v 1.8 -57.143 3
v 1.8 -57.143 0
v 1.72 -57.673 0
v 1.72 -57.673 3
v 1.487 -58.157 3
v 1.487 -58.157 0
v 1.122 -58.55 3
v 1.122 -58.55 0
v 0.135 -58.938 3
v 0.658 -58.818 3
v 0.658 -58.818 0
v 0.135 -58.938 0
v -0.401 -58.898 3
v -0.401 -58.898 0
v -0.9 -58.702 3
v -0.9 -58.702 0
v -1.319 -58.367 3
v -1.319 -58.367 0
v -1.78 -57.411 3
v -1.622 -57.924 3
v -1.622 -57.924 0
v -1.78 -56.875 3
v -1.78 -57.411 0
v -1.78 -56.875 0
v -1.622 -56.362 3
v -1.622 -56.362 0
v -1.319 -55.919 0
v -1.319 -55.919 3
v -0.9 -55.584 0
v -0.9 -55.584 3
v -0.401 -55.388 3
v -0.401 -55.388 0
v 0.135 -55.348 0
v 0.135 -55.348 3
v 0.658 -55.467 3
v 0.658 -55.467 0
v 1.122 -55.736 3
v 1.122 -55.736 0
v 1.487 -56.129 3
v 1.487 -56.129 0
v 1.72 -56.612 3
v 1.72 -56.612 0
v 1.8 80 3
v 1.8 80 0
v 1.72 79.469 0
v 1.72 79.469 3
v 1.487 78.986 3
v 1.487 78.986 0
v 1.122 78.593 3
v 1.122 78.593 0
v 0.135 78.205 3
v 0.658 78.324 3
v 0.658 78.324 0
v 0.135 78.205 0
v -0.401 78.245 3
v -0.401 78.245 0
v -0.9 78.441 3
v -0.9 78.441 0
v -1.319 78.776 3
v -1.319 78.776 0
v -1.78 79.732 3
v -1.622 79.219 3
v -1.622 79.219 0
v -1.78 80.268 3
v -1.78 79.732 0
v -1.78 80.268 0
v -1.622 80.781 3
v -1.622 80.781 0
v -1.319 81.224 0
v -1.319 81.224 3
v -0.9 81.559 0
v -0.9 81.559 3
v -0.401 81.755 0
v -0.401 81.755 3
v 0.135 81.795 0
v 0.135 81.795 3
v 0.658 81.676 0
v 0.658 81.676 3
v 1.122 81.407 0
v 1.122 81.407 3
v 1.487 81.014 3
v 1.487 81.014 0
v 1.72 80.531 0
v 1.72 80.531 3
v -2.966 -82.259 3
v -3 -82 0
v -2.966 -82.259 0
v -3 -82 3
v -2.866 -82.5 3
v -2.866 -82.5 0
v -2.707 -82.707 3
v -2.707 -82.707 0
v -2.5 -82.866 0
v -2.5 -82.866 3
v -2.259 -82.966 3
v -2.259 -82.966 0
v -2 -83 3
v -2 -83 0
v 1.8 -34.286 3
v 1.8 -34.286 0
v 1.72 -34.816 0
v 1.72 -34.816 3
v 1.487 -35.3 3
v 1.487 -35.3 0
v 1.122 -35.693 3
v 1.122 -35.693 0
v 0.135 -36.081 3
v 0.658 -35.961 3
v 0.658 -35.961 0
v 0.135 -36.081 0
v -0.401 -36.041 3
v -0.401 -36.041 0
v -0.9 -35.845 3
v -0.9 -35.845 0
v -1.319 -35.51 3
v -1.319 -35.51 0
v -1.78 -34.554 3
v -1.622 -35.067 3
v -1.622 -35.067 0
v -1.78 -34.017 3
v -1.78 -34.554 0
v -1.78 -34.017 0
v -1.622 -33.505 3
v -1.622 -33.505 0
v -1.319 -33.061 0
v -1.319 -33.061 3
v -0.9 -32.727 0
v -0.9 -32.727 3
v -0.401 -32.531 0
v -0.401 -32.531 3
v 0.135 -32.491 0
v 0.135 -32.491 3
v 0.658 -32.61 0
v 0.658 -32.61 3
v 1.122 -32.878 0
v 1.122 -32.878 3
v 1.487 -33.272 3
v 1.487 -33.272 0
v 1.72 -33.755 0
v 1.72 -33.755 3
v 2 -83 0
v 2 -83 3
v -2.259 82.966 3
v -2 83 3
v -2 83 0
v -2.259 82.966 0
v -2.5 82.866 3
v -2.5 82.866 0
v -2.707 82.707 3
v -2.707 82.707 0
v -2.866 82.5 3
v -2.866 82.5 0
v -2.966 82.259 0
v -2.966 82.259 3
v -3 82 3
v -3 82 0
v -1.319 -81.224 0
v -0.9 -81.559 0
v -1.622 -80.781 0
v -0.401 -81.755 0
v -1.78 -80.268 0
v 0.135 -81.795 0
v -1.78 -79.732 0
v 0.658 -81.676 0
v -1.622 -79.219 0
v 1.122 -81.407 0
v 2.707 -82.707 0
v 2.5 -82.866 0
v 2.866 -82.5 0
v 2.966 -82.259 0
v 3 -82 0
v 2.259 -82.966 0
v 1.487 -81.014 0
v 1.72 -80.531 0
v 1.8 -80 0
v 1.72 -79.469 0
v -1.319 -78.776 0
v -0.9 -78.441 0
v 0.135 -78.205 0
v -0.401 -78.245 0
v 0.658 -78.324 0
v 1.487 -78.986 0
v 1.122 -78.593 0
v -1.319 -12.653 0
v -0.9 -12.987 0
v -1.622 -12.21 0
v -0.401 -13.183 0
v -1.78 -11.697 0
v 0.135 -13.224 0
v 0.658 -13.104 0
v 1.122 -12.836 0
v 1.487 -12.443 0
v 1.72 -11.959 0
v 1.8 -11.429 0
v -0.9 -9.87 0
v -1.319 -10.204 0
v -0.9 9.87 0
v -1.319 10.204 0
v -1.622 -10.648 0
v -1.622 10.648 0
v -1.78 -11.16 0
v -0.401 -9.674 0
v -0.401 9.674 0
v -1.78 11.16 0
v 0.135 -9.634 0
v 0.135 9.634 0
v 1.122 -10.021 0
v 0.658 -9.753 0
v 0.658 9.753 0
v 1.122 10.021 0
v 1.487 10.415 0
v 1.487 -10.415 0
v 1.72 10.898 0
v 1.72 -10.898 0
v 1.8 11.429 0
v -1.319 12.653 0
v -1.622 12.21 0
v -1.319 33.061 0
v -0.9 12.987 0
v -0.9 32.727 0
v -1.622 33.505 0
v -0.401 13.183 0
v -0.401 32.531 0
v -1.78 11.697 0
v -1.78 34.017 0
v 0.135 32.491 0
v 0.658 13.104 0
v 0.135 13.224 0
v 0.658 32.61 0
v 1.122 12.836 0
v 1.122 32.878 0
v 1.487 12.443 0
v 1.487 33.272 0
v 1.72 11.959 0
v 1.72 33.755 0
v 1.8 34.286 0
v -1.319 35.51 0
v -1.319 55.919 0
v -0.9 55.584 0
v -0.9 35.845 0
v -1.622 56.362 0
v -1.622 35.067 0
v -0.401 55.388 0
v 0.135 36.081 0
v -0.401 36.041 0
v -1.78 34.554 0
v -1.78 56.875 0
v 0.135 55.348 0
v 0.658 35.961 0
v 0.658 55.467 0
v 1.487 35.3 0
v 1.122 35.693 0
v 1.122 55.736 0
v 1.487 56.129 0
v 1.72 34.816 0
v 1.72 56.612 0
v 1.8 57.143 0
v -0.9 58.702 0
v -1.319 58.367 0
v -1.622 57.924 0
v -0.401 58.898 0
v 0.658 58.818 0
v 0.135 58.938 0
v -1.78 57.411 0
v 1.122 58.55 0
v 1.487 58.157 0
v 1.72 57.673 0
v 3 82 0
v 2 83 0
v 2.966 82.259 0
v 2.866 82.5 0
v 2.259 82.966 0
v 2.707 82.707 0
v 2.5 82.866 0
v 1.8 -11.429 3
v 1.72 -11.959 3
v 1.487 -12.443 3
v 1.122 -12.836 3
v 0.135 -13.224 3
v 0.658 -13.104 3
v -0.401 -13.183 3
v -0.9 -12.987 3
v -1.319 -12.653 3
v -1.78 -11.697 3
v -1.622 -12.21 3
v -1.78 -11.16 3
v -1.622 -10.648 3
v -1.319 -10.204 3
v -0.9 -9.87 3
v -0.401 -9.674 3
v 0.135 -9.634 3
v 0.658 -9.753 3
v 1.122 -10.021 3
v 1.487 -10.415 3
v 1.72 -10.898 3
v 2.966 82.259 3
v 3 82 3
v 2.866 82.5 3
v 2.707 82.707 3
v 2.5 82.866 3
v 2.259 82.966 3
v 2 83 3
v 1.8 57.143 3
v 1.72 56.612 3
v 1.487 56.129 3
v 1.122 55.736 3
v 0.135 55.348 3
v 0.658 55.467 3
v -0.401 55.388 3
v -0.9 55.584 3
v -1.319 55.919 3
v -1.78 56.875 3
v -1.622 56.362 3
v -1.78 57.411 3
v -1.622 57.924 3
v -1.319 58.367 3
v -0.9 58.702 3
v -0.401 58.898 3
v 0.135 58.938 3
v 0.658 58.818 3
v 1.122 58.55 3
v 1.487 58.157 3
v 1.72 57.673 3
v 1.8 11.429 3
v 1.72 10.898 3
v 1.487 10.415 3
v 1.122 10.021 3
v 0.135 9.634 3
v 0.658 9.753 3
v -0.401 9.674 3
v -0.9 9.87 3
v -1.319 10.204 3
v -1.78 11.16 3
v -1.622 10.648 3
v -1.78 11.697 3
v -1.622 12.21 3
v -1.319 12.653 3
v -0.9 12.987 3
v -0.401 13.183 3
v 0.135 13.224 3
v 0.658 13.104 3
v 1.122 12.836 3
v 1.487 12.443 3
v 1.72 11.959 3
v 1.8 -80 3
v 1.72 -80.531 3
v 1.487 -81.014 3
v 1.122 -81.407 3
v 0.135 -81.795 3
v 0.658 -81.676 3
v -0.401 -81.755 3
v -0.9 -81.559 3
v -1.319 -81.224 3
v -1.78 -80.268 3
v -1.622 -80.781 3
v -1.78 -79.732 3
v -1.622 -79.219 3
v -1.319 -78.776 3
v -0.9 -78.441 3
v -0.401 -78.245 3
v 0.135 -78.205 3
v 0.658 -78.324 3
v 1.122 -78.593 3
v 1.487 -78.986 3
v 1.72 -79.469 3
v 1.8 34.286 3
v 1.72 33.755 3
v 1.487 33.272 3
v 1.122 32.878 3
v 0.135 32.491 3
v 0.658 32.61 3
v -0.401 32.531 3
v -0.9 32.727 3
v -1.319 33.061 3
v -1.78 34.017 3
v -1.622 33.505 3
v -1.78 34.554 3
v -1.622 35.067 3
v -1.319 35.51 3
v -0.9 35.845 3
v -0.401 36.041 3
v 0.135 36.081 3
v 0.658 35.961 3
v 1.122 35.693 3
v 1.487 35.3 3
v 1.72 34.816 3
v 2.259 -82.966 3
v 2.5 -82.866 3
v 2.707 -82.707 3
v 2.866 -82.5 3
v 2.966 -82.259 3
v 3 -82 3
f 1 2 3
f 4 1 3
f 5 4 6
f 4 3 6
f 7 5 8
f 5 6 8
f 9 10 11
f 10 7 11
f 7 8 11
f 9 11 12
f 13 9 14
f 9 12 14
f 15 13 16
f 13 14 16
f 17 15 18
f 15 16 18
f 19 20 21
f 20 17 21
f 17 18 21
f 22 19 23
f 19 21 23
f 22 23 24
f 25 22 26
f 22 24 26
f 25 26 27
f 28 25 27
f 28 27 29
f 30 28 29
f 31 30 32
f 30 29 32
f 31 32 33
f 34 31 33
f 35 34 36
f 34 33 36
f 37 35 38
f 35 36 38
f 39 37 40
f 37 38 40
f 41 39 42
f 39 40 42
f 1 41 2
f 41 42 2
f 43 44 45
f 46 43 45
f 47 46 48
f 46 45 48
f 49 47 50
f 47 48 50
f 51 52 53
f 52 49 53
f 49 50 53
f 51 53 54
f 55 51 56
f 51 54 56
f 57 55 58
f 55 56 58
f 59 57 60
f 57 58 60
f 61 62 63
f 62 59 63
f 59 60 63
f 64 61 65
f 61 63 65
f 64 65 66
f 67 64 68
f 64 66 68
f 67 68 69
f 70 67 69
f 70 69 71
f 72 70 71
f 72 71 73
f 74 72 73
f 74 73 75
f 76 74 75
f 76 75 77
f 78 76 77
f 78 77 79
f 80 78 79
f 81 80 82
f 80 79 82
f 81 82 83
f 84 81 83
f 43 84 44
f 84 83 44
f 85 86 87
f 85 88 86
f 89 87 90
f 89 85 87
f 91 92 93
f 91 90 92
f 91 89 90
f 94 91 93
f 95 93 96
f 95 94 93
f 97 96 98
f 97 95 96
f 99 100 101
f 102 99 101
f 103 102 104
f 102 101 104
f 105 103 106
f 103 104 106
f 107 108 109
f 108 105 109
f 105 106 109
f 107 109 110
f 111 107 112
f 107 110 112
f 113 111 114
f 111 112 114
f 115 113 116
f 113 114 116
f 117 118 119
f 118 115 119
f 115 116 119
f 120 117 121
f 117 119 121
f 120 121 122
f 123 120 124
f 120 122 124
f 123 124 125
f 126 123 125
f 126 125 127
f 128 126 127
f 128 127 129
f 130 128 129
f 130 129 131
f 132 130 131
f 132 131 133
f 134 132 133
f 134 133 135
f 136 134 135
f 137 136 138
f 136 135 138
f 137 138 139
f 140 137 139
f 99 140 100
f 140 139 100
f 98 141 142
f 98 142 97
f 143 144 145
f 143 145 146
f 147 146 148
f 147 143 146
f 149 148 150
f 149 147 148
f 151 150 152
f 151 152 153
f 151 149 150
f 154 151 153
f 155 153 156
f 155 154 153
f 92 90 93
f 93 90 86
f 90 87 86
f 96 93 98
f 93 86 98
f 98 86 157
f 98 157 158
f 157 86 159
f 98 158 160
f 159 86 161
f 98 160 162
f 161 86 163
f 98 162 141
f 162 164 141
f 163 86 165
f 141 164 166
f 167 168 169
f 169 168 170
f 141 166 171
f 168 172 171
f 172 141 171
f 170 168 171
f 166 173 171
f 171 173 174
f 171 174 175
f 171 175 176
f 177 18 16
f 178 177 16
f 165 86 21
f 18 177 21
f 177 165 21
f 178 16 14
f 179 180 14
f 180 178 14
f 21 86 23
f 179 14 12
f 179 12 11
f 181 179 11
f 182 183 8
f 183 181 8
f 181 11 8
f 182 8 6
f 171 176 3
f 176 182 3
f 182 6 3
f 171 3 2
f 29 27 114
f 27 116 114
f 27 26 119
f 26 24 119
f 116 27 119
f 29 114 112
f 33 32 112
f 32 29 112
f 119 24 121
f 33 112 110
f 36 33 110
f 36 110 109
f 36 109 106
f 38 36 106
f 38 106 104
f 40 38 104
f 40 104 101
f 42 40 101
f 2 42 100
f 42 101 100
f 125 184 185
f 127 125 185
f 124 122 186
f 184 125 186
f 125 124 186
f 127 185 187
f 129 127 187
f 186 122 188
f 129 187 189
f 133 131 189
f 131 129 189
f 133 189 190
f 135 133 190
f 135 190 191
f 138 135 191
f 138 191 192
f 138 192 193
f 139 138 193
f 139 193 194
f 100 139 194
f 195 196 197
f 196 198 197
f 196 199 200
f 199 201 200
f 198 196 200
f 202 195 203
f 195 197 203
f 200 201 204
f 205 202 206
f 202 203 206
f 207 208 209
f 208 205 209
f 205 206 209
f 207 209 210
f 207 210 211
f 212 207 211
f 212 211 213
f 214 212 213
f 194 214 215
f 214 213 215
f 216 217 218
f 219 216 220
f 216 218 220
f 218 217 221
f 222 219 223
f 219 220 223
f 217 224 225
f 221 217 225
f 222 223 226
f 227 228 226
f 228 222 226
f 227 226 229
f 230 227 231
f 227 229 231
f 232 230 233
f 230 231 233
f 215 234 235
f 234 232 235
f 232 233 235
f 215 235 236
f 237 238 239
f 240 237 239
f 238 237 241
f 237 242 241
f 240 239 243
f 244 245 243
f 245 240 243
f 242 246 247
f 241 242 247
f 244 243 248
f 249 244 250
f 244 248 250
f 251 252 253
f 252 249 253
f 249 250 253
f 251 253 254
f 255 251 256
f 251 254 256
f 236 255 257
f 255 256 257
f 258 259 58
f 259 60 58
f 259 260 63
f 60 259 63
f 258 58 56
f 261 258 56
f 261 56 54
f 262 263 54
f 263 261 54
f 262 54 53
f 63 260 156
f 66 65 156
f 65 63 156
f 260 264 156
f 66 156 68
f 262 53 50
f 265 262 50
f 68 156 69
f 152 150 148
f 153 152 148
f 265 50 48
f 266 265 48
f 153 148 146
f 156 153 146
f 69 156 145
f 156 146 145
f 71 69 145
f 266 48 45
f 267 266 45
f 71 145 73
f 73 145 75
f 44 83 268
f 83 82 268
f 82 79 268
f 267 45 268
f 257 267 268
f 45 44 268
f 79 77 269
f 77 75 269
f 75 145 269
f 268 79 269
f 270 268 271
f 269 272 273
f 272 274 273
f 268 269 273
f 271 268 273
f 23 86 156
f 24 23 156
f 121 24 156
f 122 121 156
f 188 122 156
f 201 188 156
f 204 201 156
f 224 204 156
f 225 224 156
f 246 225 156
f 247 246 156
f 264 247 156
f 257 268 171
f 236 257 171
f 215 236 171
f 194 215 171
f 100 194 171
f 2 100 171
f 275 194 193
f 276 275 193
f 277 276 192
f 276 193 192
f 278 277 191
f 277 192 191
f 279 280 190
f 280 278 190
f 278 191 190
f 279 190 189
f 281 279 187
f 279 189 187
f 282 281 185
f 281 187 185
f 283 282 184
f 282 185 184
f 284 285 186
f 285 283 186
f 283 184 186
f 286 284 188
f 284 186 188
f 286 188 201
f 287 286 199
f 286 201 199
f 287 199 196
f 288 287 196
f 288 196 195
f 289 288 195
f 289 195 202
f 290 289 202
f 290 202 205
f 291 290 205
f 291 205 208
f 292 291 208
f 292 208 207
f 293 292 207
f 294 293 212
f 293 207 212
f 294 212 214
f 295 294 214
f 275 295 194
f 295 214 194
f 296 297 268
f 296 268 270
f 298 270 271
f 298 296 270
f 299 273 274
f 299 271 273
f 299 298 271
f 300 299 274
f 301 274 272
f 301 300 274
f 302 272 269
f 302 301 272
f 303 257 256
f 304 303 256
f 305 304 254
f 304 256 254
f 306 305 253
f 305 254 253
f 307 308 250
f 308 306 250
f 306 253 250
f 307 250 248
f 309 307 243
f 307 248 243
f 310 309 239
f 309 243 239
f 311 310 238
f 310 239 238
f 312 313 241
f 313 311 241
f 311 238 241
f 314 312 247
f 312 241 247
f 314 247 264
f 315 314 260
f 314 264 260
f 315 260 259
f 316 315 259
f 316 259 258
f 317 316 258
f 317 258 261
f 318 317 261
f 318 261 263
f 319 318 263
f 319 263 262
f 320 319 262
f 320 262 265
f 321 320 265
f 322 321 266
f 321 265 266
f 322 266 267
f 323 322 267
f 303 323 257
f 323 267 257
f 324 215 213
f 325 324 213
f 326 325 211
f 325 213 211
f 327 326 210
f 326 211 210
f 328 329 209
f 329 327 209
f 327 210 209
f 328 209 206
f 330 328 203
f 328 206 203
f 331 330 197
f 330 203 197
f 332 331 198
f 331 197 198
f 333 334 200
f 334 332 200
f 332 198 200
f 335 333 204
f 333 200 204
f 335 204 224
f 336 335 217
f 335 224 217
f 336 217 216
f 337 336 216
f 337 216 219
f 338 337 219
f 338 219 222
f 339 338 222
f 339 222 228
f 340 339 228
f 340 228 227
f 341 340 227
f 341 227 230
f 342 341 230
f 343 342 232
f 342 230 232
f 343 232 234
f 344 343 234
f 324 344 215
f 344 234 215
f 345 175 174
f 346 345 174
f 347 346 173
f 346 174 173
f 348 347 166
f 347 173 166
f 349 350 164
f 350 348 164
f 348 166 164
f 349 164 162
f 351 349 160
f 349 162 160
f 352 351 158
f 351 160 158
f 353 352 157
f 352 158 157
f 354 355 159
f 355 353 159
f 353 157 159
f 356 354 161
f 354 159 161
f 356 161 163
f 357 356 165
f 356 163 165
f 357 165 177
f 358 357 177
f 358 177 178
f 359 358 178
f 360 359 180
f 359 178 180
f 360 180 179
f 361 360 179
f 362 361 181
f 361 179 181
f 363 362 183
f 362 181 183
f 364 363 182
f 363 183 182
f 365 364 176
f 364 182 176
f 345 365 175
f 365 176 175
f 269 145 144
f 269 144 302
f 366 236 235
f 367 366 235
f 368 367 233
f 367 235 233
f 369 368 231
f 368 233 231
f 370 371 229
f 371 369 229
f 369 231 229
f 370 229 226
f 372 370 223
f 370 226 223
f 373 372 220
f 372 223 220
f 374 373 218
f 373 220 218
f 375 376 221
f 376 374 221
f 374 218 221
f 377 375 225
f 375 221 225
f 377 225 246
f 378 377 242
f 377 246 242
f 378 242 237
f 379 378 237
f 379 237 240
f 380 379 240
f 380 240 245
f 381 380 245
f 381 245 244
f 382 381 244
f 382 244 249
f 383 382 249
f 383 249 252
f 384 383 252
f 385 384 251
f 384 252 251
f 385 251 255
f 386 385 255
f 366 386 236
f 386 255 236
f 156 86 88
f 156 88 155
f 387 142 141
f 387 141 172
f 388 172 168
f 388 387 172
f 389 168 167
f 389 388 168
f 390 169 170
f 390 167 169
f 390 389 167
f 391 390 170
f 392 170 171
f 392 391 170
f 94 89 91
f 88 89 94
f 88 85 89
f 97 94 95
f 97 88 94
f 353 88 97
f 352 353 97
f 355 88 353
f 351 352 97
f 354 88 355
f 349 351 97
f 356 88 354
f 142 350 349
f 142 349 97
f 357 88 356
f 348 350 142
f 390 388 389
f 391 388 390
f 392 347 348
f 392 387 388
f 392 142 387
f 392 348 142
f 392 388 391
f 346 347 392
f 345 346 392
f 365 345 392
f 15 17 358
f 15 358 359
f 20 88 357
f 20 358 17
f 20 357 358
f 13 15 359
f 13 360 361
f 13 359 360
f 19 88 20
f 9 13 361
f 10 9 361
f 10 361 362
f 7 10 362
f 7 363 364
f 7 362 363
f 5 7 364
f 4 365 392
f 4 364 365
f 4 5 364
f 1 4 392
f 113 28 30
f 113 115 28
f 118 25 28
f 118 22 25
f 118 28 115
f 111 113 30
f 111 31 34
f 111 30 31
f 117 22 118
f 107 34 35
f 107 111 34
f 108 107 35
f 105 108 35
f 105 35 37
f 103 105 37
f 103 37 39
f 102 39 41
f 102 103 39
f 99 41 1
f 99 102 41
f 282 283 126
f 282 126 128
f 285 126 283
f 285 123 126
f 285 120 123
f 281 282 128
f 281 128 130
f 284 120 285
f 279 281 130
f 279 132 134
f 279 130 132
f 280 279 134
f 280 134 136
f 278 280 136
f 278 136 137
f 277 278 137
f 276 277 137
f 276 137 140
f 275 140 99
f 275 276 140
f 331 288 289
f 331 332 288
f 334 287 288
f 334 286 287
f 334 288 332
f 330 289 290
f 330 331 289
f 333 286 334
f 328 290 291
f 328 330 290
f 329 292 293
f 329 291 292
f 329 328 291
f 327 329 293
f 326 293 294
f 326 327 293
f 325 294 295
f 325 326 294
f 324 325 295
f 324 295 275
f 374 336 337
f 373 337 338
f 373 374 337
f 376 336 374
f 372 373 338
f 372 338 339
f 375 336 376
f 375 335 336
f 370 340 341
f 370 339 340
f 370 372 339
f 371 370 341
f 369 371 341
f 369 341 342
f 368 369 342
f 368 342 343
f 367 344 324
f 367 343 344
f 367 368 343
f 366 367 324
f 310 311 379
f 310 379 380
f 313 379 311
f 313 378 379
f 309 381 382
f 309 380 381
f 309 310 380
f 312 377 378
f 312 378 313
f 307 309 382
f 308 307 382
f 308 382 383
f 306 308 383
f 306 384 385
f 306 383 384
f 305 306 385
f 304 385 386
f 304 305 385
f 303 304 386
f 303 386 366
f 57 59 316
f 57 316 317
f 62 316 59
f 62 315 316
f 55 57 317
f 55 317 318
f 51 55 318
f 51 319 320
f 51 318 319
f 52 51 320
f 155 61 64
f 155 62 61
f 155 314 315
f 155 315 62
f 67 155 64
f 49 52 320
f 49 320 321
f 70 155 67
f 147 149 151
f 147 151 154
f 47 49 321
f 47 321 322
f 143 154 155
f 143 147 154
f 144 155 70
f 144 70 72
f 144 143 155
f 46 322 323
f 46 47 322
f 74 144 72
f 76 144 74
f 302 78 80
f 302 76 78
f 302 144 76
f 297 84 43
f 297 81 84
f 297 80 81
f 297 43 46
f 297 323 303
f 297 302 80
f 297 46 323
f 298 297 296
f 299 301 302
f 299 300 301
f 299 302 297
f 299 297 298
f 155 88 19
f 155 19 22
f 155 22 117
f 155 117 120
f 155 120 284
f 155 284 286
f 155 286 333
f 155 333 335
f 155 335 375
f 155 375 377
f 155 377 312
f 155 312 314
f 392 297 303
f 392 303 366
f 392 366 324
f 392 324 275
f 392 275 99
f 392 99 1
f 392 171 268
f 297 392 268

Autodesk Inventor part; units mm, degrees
ref_plane "YZ Plane" through (0, 0, 0) normal (1, 0, 0) x (0, 1, 0)
ref_plane "XZ Plane" through (0, 0, 0) normal (0, 1, 0) x (-1, 0, 0)
ref_plane "XY Plane" through (0, 0, 0) normal (0, 0, 1) x (1, 0, 0)
ref_plane "Work Plane1" through (0, 0, 0) normal (0, 0, 1) x (1, 0, 0)
sketch "Sketch1" plane through (0, 0, 0) normal (0, 0, 1) x (1, 0, 0)
  circle A0 centre (0, 80) radius 1.8 projected
  circle A1 centre (0, 11.4286) radius 1.8 projected
  circle A2 centre (0, -34.2857) radius 1.8 projected
  circle A3 centre (0, -80) radius 1.8 projected
  circle A4 centre (0, -57.1429) radius 1.8 projected
  circle A5 centre (0, -11.4286) radius 1.8 projected
  circle A6 centre (0, 57.1429) radius 1.8 projected
  circle A7 centre (0, 34.2857) radius 1.8 projected
  line L0 (-3, 83) -> (3, 83) projected
  line L1 (-3, -83) -> (-3, 83) projected
  line L2 (3, -83) -> (-3, -83) projected
  line L3 (3, -83) -> (3, 83) projected
  point P0 (0, 0)
extrude "Extrusion1" add sketch "Sketch1" along normal blind 3
sketch "Sketch2" plane through (0, 0, 3) normal (0, 0, 1) x (1, 0, 0)
  point P0 (0, 0)
fillet "Fillet1" radius 1 4 edges at (3, 83, 1.5) (-3, 83, 1.5) (-3, -83, 1.5) (3, -83, 1.5)
properties part number "petg_holder_2"
